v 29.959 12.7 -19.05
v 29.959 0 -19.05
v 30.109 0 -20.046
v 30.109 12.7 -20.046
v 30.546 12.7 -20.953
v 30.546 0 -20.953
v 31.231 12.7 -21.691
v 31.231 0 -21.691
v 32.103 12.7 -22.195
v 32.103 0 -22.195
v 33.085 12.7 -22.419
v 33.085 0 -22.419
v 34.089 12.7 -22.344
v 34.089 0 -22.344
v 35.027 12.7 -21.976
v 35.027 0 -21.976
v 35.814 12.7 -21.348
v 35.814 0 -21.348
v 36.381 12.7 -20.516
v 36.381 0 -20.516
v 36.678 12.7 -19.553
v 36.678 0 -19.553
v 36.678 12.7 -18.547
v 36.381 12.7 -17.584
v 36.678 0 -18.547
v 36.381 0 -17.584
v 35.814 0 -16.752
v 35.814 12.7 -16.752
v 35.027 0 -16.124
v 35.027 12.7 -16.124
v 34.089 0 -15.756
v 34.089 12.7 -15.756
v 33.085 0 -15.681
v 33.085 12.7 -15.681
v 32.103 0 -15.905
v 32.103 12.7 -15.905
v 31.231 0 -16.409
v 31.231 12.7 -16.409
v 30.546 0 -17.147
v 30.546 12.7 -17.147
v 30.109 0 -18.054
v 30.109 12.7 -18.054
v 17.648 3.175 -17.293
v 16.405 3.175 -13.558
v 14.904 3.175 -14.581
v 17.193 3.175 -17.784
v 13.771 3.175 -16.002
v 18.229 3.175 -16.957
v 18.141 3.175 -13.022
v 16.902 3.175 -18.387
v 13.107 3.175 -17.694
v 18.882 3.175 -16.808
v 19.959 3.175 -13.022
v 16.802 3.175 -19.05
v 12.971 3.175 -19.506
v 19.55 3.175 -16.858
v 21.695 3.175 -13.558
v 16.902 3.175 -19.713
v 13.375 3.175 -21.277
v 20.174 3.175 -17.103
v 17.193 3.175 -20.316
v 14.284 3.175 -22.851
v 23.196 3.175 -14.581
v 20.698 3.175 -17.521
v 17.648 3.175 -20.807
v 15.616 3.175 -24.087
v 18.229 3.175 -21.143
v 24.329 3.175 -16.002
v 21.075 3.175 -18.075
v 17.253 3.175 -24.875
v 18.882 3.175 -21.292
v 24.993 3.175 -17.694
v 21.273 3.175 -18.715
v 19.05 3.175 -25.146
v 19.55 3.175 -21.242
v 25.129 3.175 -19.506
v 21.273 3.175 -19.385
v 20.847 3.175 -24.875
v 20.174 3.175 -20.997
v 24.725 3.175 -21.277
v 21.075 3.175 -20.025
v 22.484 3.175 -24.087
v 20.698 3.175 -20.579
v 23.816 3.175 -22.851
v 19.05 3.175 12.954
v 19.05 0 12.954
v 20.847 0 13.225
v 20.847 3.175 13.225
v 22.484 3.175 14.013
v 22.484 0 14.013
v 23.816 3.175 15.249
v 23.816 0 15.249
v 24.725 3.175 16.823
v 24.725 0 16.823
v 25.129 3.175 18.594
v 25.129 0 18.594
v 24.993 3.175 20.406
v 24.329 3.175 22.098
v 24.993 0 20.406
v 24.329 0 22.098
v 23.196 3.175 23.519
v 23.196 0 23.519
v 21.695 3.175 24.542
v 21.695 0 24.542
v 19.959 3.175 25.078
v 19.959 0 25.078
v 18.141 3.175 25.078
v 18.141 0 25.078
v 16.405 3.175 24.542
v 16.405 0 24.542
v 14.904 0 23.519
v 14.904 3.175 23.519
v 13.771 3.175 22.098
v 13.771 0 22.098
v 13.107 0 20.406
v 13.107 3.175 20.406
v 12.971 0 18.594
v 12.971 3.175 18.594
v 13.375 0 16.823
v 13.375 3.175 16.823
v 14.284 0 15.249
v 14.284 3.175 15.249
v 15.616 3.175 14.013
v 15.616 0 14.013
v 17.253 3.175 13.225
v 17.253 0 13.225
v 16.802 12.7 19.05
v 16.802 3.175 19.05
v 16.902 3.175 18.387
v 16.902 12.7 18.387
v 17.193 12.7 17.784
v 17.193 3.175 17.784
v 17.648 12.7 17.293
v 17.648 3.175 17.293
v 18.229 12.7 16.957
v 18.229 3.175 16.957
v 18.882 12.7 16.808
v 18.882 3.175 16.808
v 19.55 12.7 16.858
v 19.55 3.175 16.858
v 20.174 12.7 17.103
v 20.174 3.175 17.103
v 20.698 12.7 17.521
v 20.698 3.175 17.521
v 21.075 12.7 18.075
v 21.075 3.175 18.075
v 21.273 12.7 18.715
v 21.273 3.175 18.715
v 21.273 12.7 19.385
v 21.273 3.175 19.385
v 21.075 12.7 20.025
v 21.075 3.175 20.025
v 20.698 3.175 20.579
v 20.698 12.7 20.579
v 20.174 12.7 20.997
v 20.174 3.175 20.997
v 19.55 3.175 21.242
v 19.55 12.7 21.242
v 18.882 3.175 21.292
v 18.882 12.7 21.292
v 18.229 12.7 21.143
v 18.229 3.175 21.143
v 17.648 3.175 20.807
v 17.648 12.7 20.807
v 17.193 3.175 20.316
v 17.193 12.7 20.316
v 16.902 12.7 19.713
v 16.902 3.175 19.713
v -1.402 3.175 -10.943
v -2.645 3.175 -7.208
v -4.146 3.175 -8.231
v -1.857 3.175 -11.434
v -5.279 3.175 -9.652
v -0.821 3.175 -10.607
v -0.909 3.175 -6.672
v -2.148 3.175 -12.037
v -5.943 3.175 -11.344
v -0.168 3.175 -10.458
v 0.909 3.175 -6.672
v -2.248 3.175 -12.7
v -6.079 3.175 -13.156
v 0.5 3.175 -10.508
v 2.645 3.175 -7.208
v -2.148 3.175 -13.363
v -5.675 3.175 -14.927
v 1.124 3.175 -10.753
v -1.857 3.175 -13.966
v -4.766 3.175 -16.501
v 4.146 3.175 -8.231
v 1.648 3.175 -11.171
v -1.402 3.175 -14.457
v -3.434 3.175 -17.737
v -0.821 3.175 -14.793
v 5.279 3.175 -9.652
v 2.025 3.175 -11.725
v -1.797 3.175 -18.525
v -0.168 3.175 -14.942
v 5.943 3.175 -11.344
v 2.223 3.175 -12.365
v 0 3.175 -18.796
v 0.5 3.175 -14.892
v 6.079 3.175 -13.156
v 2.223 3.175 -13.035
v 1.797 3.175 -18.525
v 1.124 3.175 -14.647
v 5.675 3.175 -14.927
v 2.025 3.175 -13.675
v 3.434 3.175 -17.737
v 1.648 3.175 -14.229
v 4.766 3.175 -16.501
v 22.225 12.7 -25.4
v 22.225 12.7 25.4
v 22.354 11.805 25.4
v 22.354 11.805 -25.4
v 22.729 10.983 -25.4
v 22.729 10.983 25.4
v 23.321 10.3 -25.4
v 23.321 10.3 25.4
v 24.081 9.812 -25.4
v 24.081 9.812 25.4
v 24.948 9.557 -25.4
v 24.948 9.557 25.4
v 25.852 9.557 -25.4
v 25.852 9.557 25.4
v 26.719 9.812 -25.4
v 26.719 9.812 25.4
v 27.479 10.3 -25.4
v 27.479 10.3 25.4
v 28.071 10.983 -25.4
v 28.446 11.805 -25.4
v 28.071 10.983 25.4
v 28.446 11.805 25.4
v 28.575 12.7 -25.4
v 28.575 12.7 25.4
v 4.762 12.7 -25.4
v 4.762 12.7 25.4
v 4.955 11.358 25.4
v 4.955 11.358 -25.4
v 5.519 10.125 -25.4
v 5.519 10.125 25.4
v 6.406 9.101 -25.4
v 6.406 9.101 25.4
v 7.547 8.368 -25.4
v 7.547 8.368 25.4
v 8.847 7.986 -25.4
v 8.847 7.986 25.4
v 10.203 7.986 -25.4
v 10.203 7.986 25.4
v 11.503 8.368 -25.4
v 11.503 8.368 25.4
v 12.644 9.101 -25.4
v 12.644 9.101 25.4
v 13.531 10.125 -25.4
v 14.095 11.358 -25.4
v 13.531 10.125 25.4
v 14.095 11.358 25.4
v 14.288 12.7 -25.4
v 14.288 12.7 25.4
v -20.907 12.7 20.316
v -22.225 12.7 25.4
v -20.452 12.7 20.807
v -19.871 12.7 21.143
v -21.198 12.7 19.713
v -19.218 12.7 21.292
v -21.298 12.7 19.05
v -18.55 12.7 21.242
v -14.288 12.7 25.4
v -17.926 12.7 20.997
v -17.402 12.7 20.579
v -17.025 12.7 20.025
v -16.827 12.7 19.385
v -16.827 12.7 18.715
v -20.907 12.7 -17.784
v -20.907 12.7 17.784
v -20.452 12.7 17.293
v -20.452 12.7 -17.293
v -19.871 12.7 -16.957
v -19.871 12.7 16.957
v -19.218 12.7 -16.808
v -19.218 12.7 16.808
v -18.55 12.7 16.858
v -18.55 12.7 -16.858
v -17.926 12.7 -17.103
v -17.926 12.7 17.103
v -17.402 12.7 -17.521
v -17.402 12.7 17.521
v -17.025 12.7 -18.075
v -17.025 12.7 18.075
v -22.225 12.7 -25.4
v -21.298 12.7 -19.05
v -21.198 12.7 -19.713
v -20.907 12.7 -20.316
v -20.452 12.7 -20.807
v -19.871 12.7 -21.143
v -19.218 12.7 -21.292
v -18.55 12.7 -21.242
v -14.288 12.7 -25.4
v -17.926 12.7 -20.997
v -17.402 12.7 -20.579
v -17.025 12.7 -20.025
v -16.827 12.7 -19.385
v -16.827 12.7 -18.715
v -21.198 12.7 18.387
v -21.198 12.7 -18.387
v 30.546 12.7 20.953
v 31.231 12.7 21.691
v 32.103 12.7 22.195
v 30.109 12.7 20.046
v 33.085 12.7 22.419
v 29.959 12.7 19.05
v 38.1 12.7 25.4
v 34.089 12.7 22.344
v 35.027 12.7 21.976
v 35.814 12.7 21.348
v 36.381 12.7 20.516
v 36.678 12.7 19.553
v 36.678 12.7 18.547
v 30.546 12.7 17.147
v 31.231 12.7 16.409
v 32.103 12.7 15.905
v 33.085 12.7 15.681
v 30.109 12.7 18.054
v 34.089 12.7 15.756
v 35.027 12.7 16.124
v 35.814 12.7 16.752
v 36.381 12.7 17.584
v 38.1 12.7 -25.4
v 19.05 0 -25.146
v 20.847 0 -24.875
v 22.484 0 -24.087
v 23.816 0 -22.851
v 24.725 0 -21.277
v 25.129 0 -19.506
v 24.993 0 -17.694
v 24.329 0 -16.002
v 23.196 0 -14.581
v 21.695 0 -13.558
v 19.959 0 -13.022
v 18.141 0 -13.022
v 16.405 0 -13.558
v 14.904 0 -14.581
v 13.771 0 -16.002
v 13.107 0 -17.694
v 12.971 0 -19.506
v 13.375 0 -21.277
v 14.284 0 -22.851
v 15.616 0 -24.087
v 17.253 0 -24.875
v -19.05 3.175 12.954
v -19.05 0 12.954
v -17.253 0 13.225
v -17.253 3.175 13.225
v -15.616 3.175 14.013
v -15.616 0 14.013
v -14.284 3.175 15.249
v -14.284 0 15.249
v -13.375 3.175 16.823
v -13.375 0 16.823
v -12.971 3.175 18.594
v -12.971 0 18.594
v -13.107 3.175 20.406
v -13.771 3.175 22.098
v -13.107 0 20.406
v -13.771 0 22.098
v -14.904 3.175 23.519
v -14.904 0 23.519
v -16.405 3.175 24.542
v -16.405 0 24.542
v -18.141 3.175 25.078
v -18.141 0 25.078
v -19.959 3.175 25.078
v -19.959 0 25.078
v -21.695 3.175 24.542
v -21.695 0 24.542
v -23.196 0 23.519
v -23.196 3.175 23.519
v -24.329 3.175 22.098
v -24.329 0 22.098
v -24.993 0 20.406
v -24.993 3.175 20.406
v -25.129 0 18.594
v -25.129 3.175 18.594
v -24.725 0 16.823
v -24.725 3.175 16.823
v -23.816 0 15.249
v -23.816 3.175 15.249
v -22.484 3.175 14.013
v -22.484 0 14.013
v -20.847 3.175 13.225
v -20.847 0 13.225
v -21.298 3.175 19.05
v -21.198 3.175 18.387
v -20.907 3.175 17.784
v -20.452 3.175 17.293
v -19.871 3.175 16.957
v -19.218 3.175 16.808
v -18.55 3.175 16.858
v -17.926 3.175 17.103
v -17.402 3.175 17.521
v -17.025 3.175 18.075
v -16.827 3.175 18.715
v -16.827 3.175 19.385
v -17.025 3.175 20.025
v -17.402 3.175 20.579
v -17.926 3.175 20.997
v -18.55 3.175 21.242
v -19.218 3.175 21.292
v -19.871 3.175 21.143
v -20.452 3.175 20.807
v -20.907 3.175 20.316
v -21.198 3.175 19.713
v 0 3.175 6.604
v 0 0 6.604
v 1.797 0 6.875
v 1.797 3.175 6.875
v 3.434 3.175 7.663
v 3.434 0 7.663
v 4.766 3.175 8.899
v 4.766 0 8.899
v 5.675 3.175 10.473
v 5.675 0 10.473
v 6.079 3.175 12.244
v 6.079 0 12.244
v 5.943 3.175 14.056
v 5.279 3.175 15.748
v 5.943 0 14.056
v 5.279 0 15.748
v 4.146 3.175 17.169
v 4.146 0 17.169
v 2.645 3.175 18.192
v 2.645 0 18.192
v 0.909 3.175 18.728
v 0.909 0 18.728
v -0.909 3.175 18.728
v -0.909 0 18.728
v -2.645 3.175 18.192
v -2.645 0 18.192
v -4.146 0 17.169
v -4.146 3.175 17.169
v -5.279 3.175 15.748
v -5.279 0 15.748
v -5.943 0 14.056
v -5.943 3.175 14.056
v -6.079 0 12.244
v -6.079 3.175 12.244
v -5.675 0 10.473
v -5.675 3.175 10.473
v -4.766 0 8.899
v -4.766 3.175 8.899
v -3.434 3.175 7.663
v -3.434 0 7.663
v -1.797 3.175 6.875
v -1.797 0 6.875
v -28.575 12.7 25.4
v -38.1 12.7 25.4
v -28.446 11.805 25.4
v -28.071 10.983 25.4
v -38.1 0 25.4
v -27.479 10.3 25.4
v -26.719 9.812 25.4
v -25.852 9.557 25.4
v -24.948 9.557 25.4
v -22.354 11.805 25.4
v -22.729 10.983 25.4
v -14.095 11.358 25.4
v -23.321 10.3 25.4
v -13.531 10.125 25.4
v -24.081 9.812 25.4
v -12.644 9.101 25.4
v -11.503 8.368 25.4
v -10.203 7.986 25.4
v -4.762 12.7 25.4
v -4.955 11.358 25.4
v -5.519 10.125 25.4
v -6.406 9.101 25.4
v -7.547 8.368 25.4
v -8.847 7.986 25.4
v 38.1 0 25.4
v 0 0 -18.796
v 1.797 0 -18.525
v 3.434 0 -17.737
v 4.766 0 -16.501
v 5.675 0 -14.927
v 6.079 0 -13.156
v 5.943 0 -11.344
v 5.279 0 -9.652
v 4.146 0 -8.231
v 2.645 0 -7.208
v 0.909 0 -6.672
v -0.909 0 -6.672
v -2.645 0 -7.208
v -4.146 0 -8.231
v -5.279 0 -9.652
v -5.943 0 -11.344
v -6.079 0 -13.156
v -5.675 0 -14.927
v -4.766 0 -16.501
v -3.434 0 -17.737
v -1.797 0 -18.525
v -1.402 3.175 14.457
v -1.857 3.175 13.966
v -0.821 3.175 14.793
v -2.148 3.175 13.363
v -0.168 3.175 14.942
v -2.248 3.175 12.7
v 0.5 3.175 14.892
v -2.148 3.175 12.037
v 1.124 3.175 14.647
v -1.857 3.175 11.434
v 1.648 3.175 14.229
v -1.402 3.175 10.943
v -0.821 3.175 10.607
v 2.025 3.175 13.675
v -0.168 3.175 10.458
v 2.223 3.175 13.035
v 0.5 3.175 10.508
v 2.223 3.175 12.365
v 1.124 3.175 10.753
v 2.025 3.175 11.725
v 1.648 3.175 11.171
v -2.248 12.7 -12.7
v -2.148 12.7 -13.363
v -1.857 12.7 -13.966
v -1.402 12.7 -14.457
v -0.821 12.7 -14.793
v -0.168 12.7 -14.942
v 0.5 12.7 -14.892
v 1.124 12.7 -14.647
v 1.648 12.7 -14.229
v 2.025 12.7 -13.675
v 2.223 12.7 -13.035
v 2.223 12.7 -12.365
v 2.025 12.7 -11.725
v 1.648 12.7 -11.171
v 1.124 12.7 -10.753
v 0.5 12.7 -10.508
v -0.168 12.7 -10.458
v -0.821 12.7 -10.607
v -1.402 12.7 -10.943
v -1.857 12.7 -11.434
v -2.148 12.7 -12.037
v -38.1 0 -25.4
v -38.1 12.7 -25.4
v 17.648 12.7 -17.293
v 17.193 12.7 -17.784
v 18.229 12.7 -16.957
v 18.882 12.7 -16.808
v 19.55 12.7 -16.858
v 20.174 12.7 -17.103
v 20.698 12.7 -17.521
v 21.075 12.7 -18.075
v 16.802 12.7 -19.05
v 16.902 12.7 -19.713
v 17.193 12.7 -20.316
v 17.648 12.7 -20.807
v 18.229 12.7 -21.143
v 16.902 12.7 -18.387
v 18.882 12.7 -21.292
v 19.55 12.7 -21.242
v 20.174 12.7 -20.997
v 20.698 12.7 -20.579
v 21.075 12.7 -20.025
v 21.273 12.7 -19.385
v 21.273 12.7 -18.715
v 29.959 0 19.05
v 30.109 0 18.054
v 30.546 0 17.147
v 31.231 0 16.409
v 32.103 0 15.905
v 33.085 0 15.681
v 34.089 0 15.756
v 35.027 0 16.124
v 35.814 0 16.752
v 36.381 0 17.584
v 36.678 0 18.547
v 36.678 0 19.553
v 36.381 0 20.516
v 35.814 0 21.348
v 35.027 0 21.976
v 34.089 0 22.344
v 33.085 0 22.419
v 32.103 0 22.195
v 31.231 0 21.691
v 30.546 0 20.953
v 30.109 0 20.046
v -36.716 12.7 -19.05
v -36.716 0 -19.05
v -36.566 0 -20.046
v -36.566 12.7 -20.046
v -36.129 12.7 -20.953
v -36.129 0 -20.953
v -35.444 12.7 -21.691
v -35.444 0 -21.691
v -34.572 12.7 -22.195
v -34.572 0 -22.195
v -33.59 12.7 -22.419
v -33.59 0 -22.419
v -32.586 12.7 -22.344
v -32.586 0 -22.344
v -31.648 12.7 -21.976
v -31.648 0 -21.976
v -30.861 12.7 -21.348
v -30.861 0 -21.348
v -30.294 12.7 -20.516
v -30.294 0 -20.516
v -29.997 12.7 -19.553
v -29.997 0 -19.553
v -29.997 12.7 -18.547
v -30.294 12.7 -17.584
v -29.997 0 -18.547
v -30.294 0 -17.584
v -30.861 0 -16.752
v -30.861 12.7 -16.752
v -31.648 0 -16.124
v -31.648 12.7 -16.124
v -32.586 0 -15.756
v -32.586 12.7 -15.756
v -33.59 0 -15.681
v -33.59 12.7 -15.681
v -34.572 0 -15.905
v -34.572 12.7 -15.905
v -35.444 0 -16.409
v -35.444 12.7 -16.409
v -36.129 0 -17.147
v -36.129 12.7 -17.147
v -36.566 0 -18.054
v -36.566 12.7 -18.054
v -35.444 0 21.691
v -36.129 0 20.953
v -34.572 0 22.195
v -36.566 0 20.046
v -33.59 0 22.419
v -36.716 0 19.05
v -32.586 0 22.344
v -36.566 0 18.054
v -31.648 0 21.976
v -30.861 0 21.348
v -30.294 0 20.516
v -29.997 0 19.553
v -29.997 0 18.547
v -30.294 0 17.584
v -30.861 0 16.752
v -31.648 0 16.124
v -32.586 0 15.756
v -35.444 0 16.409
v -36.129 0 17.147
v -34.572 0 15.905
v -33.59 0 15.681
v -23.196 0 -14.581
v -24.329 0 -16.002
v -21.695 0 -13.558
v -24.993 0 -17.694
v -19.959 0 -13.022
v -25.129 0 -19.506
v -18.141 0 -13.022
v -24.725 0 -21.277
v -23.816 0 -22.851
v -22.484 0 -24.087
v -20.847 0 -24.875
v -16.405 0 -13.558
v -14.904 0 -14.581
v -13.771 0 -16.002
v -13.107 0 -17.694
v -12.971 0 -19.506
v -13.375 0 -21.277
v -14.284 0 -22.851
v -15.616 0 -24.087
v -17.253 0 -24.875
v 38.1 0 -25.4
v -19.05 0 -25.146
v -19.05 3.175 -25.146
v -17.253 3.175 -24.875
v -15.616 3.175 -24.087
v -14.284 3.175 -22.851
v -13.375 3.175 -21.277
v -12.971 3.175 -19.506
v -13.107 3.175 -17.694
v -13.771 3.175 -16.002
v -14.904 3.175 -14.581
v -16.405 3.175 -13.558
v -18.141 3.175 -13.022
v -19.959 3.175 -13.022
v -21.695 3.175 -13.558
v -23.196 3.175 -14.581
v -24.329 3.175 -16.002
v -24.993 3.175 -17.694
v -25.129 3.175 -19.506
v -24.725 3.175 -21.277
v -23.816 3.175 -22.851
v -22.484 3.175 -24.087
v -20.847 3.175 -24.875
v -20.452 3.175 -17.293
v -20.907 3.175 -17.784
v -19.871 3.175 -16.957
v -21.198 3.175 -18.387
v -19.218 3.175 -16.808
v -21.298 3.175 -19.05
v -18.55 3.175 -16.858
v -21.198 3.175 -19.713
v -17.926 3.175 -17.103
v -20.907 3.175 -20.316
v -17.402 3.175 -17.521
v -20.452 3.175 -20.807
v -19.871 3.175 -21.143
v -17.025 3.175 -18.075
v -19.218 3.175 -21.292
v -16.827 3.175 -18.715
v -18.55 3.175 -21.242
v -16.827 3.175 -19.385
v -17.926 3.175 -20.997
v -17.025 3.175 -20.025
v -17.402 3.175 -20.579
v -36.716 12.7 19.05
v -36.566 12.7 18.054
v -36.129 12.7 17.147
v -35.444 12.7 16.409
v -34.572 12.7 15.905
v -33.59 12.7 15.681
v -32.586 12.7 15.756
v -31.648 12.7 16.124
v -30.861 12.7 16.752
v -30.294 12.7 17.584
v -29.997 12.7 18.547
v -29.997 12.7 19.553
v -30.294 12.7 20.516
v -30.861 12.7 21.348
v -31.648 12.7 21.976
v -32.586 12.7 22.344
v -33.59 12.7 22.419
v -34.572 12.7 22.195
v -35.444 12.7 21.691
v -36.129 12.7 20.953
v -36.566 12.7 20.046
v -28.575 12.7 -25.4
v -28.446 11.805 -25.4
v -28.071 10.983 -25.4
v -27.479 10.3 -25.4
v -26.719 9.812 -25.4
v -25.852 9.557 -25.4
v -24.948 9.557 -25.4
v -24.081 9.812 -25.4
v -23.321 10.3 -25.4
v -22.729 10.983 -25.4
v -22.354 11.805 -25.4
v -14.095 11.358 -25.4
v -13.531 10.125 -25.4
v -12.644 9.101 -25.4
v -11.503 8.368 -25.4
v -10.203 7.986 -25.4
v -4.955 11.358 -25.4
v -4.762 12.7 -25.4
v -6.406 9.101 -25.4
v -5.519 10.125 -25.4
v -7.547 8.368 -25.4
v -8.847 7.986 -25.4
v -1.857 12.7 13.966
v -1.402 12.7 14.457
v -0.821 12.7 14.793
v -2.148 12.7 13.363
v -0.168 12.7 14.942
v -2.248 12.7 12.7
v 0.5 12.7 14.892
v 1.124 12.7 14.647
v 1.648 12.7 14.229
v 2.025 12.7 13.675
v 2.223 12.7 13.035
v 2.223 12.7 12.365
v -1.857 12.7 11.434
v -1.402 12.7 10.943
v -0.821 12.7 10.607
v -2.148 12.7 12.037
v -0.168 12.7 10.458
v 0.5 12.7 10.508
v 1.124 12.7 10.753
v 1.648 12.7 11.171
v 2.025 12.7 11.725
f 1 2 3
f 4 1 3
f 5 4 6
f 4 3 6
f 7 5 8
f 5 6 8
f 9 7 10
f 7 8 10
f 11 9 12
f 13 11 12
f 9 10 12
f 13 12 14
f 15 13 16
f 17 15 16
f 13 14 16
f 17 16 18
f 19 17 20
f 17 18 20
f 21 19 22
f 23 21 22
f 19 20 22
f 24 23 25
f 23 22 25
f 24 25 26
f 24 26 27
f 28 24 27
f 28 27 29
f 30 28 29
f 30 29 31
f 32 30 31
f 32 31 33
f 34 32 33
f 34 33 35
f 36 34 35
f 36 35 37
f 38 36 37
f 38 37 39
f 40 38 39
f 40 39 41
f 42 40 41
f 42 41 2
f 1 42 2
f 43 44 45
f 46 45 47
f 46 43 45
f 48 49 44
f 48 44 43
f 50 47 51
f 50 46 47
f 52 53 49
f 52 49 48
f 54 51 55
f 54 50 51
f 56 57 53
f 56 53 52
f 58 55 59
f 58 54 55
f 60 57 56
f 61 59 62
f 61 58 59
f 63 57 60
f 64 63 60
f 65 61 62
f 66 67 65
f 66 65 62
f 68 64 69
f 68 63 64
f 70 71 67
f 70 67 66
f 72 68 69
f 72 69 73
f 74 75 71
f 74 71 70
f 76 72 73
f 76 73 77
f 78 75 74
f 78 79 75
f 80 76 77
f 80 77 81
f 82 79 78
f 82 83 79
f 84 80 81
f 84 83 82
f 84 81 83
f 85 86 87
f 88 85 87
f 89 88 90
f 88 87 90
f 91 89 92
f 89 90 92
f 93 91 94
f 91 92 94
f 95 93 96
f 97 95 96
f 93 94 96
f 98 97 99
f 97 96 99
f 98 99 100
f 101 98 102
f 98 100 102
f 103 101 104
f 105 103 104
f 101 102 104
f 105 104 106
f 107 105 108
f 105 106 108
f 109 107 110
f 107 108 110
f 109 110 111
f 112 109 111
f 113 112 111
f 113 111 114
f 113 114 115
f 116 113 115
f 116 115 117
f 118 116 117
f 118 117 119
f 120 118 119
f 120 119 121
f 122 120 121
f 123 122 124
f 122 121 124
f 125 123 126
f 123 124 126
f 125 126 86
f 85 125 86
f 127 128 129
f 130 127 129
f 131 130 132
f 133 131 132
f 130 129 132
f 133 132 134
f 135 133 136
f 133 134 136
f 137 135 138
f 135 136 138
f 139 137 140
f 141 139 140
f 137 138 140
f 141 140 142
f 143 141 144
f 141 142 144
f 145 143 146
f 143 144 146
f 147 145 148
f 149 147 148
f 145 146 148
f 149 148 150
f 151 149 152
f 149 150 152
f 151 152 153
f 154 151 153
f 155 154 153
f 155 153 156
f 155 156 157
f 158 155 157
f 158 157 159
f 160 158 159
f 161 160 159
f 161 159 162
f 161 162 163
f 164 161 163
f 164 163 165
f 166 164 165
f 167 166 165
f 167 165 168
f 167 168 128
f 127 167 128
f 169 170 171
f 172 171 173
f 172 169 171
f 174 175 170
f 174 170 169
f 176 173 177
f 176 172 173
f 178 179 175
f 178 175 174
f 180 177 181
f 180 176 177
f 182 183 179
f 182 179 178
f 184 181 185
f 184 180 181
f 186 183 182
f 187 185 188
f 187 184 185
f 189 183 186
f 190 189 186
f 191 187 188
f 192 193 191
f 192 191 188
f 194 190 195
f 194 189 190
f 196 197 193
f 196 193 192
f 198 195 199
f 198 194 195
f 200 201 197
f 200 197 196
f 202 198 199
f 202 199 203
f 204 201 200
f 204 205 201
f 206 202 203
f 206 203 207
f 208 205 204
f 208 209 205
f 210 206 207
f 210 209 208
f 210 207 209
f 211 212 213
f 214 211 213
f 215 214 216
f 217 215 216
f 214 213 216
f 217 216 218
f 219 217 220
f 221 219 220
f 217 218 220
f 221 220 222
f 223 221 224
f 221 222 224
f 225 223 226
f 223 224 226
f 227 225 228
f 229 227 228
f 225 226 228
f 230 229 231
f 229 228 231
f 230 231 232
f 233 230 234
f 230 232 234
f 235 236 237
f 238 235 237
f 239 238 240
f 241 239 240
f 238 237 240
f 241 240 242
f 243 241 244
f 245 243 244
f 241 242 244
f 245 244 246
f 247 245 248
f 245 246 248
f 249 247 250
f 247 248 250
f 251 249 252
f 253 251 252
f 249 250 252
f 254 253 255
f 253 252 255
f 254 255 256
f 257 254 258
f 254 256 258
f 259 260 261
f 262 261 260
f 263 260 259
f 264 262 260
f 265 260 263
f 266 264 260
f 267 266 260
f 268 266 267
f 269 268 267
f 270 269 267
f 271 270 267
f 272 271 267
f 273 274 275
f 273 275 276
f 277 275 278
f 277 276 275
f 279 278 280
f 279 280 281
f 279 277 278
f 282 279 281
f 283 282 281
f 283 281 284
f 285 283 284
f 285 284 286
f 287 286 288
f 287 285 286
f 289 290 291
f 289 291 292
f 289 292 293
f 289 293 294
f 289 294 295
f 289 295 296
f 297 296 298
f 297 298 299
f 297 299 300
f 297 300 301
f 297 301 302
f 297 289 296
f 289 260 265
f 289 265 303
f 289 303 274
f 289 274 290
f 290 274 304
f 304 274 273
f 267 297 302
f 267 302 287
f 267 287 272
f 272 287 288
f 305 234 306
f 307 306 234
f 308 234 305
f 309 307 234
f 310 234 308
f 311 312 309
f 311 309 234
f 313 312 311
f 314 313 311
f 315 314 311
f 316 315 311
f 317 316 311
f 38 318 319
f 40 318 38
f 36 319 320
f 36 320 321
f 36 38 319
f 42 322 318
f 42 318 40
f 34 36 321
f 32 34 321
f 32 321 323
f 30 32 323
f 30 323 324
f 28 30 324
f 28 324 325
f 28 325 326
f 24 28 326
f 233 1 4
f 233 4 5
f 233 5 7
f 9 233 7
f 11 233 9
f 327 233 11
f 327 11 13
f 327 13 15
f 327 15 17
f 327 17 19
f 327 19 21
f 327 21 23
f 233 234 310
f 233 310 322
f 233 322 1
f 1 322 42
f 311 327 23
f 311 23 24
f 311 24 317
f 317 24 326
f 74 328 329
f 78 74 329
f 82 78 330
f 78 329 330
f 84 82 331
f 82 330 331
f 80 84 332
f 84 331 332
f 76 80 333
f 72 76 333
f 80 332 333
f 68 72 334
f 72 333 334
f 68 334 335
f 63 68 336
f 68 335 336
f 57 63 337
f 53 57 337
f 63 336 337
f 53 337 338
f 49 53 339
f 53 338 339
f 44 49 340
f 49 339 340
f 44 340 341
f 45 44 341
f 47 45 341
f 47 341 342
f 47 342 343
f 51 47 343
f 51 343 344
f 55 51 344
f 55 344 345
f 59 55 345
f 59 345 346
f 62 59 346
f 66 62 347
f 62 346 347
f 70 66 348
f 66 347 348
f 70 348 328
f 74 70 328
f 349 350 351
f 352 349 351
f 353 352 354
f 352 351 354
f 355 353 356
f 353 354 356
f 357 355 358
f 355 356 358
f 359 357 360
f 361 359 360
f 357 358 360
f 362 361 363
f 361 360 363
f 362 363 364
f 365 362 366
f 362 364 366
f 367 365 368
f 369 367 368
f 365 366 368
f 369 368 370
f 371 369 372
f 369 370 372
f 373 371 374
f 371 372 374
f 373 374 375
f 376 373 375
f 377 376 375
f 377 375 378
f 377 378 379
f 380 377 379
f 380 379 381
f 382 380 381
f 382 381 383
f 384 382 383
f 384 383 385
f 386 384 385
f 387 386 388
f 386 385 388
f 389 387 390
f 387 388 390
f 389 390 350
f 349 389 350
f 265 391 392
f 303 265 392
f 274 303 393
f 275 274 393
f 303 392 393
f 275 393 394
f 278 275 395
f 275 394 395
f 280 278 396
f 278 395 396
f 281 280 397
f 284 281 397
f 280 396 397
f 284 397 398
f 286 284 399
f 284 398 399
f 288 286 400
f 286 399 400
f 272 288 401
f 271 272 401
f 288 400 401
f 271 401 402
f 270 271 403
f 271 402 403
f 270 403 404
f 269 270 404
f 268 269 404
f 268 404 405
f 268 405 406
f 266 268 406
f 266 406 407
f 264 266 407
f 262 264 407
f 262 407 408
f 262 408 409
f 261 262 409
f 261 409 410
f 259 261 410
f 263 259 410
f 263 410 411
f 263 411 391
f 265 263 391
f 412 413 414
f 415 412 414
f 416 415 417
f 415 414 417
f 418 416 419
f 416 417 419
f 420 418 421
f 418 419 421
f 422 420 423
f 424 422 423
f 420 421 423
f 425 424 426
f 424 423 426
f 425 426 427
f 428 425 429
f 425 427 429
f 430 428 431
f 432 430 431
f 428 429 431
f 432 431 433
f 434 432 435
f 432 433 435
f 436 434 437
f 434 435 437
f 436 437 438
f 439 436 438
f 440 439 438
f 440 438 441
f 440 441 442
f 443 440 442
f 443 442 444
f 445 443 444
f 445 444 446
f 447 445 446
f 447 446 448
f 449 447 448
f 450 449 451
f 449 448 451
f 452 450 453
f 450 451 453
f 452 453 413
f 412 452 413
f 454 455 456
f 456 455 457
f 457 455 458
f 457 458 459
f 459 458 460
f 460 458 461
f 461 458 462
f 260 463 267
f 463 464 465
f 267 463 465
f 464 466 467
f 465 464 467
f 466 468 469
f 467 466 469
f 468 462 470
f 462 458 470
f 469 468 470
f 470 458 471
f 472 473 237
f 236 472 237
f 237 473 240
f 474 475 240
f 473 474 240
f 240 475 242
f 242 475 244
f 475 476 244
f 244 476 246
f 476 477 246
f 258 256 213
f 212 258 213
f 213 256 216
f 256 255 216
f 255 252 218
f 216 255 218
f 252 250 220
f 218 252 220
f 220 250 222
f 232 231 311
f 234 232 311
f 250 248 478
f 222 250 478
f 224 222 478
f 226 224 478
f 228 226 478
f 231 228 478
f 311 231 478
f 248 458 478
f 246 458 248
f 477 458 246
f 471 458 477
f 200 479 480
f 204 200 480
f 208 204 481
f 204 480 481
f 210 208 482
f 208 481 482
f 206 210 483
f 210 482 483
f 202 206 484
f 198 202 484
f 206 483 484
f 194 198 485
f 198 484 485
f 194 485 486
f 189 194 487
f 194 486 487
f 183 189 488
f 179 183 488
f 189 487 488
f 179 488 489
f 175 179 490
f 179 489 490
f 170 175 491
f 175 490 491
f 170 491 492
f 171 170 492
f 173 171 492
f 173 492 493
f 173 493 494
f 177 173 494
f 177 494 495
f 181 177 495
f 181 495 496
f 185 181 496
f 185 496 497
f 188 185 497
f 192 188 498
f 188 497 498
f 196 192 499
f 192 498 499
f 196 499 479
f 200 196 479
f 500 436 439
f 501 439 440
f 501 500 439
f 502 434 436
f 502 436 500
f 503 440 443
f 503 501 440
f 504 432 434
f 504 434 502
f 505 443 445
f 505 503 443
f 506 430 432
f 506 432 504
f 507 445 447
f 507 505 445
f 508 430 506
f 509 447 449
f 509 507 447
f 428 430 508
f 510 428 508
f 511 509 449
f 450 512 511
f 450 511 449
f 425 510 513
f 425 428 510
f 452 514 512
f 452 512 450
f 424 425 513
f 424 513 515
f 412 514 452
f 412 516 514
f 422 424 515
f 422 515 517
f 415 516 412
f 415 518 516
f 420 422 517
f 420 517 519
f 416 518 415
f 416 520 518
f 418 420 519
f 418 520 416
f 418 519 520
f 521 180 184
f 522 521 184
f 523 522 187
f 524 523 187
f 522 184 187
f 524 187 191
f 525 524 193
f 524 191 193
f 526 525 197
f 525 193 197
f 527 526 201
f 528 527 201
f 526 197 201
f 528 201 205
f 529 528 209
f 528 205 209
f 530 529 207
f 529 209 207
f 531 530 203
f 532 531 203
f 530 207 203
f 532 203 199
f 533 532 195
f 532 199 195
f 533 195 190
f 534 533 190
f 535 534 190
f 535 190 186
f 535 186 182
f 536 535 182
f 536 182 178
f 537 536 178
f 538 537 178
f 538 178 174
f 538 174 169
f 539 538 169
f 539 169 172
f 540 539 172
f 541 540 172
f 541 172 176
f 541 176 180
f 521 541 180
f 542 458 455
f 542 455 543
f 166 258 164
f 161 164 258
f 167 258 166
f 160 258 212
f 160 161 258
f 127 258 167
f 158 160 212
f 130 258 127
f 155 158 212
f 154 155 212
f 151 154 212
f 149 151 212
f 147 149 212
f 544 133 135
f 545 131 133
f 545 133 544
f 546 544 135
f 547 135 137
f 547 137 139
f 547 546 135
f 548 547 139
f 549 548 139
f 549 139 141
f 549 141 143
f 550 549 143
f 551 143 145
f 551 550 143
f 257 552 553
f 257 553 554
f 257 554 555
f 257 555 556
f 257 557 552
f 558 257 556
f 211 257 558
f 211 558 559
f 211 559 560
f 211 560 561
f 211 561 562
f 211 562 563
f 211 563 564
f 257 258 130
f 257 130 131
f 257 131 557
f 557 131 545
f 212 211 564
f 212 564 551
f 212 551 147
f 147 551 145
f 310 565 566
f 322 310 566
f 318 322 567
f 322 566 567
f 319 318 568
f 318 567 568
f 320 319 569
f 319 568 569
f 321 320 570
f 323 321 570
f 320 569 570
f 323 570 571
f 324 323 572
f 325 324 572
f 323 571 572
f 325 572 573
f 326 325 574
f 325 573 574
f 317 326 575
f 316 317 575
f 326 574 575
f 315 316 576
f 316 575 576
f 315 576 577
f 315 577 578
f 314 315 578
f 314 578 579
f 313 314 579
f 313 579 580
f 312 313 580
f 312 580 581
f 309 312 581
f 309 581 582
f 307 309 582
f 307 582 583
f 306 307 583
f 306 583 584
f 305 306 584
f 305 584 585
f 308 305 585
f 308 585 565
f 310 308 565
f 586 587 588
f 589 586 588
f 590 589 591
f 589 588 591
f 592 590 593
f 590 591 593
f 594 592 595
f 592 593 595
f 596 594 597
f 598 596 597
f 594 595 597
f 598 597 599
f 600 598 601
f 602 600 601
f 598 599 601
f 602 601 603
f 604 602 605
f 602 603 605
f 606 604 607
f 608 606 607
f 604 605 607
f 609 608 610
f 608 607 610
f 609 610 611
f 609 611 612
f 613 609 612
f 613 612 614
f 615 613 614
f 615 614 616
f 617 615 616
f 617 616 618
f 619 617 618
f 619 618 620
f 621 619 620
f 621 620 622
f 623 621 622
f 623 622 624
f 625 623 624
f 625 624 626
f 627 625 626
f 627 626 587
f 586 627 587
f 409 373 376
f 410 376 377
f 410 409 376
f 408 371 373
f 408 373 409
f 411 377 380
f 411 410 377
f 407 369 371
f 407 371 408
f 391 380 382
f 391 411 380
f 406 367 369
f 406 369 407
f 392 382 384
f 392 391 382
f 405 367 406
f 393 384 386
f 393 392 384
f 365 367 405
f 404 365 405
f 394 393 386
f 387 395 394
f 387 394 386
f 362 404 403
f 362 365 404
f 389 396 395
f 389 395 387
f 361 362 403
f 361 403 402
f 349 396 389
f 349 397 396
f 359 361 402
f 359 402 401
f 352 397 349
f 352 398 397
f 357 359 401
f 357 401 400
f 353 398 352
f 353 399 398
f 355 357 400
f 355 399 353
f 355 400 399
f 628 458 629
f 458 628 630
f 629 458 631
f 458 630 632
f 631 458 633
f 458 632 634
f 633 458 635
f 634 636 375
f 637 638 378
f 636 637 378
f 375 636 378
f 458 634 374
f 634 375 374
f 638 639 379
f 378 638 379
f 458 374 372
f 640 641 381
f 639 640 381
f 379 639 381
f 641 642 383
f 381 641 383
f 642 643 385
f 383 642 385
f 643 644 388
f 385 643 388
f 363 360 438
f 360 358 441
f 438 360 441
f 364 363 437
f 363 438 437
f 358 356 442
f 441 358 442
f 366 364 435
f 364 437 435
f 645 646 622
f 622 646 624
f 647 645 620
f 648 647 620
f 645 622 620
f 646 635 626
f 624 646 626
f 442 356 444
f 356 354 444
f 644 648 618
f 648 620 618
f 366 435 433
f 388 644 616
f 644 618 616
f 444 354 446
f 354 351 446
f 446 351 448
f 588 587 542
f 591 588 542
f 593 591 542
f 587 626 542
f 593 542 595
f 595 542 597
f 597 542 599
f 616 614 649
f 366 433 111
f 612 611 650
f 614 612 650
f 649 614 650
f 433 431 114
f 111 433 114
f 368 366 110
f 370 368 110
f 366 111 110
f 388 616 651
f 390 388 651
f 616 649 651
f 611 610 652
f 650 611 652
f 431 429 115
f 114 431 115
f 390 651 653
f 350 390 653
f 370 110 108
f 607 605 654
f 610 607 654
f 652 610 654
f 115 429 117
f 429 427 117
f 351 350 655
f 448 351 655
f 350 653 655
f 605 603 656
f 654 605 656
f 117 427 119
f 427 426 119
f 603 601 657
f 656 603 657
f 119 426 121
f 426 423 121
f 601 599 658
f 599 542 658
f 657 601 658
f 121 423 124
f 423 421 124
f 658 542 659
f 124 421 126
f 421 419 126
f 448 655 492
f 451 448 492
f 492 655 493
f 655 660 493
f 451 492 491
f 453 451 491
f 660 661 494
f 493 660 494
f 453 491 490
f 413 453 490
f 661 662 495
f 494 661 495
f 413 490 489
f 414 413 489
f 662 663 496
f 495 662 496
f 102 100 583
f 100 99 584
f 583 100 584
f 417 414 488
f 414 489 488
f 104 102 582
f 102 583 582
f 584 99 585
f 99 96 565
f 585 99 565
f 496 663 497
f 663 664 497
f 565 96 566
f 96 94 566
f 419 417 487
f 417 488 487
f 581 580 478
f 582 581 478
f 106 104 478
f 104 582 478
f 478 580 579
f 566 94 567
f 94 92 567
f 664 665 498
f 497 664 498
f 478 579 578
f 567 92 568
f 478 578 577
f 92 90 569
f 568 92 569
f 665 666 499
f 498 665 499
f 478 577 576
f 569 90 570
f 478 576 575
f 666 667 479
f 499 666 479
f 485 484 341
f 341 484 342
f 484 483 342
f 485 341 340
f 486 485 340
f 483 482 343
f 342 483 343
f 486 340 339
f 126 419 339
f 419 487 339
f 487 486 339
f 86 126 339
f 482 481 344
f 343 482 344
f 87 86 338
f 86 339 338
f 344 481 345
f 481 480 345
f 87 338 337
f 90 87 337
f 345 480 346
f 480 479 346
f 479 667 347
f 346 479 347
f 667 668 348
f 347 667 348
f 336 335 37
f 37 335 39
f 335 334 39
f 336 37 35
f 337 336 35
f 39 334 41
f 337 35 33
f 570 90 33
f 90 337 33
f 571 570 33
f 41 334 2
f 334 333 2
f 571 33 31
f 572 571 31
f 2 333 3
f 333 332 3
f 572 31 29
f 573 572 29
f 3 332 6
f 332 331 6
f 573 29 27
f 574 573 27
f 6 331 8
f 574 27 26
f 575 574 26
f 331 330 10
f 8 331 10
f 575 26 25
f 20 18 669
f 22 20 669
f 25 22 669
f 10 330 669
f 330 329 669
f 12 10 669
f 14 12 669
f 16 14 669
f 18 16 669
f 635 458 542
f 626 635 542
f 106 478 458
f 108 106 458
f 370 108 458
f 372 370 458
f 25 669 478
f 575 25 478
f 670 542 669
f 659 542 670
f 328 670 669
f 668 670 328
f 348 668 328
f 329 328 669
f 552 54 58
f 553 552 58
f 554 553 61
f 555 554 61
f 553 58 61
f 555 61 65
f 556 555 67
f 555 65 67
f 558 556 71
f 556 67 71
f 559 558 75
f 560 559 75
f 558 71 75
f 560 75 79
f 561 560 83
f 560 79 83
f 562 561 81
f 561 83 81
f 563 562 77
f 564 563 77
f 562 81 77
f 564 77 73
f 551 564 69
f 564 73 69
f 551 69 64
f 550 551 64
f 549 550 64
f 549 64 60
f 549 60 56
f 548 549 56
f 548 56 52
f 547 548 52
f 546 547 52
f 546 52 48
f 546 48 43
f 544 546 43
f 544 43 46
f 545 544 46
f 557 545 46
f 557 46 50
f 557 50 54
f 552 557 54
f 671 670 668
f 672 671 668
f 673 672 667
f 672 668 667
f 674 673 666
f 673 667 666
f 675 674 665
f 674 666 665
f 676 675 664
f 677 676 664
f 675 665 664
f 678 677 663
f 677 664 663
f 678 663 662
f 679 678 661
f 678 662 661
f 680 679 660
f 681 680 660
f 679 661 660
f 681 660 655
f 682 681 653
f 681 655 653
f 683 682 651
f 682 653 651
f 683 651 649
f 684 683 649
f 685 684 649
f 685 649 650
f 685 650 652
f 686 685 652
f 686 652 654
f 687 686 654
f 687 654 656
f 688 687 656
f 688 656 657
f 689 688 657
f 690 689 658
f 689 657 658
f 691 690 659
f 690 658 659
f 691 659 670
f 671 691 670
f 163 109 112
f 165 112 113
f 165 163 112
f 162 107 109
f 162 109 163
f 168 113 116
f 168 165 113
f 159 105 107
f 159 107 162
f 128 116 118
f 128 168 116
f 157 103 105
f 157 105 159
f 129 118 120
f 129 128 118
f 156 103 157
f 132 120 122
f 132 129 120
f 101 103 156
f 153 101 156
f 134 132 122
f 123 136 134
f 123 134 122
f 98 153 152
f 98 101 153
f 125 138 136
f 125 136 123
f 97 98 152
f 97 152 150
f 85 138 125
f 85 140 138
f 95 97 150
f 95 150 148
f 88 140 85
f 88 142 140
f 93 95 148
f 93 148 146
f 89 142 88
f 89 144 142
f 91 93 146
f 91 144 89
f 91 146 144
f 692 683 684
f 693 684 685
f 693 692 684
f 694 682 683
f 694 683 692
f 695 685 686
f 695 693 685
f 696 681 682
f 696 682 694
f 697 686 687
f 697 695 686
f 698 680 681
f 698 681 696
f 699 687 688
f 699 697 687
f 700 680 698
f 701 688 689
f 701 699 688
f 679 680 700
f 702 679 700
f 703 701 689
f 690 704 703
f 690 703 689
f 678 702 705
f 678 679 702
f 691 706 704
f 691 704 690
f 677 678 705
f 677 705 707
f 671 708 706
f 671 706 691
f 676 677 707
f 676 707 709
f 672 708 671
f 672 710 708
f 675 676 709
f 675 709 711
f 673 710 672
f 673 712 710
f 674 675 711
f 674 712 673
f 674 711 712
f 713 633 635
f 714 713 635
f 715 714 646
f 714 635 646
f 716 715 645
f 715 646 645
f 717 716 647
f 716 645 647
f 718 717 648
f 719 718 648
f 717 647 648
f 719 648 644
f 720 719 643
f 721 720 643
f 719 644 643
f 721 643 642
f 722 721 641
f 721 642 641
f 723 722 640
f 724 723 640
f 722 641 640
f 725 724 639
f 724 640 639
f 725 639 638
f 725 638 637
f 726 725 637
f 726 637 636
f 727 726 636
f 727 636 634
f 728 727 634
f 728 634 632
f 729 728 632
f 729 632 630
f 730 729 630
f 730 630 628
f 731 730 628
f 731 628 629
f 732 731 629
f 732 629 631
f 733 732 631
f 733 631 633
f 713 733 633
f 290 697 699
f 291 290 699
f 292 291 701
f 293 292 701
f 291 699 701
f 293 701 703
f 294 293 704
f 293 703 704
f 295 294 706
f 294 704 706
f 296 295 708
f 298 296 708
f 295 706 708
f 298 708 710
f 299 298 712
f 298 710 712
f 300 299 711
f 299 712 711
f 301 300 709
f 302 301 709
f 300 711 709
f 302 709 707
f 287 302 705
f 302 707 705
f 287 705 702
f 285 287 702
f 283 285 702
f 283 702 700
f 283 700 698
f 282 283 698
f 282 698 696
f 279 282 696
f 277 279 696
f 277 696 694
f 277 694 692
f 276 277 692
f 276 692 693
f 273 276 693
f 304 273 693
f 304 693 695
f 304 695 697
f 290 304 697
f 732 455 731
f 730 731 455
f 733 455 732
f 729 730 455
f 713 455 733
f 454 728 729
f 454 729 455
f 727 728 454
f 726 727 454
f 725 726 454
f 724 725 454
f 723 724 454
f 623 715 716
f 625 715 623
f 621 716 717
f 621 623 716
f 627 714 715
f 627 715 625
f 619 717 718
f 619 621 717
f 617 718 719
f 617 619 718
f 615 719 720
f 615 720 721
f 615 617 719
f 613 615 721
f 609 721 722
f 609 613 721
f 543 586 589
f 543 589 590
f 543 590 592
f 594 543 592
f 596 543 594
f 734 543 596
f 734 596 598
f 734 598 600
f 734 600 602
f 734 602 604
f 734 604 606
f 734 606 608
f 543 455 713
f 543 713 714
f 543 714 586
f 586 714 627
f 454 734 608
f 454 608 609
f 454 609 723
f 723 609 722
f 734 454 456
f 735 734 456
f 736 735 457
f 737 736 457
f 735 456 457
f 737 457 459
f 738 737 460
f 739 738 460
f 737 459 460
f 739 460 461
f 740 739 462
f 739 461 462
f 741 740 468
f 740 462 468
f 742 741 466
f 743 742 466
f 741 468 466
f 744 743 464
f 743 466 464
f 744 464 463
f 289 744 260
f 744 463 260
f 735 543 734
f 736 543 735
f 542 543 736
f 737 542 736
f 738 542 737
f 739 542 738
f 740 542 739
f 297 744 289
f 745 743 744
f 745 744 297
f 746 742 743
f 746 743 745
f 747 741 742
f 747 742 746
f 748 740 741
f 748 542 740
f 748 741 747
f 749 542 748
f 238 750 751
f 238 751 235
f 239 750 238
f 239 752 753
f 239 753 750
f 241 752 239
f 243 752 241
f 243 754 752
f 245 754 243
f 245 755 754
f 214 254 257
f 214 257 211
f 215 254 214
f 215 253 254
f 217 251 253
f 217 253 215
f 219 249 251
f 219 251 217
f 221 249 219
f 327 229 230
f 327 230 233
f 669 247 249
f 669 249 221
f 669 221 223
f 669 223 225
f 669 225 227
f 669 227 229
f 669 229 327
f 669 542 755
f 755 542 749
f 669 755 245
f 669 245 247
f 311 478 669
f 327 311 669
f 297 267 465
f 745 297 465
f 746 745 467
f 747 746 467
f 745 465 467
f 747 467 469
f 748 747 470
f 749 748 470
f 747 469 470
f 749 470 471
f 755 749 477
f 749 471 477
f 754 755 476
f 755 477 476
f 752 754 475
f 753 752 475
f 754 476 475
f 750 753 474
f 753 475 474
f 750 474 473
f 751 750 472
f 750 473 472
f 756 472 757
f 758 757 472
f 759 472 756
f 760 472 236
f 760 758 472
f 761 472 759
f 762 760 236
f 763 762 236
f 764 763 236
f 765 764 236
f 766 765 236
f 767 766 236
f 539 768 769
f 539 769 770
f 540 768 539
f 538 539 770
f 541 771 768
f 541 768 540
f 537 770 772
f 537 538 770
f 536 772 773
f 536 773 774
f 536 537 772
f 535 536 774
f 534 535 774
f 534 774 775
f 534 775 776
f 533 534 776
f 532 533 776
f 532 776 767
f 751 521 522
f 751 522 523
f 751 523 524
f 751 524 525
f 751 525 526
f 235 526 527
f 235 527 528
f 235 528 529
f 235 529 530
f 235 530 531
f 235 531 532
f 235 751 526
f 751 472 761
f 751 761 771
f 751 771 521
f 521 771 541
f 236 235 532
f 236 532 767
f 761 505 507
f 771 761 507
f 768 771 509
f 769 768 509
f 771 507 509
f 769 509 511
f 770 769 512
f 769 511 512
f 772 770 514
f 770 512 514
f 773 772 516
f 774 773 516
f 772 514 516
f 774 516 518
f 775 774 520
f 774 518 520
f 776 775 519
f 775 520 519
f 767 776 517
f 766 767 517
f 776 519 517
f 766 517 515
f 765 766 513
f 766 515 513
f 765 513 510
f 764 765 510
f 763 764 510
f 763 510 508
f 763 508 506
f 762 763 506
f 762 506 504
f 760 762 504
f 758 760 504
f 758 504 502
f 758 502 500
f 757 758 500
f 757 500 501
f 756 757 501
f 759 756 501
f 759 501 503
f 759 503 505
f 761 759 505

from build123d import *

# Parameters (mm, degrees)
SKETCH1_W               = 76.2
SKETCH1_H               = 50.8
BOSS_EXTRUDE1_DEPTH     = 12.7
SKETCH2_R               = 3.175
CUT_EXTRUDE1_DEPTH      = 65.757547823
SKETCH3_R               = 4.7625
CUT_EXTRUDE2_DEPTH      = 65.757547823
F_1_4_CLEARANCE_HOLE1_D = 6.7564
F_8_CLEARANCE_HOLE1_D   = 4.4958
SKETCH8_R               = 6.096
CUT_EXTRUDE3_DEPTH      = 3.175


with BuildPart() as part:
    # Sketch1 → Boss-Extrude1 (new body)
    with BuildSketch(Plane(origin=(0, 0, 0), x_dir=(1, 0, 0), z_dir=(0, 1, 0))):
        Rectangle(SKETCH1_W, SKETCH1_H)
    extrude(amount=BOSS_EXTRUDE1_DEPTH)

    # Sketch2 → Cut-Extrude1 (cut, through all)
    with BuildSketch(Plane.XY.offset(25.4)):
        with Locations((-25.4, 12.7)):
            Circle(SKETCH2_R)
        with Locations((25.4, 12.7)):
            Circle(SKETCH2_R)
    extrude(amount=-CUT_EXTRUDE1_DEPTH, mode=Mode.SUBTRACT)

    # Sketch3 → Cut-Extrude2 (cut, through all)
    with BuildSketch(Plane.XY.offset(25.4)):
        with Locations((-9.525, 12.7)):
            Circle(SKETCH3_R)
        with Locations((9.525, 12.7)):
            Circle(SKETCH3_R)
    extrude(amount=-CUT_EXTRUDE2_DEPTH, mode=Mode.SUBTRACT)

    # 1/4 Clearance Hole1 (through all)
    with Locations(Plane(origin=(0, 12.7, 0), x_dir=(1, 0, 0), z_dir=(0, 1, 0))):
        with Locations((-33.3375, -19.05), (-33.3375, 19.05), (33.3375, 19.05), (33.3375, -19.05)):
            Hole(F_1_4_CLEARANCE_HOLE1_D / 2)

    # #8 Clearance Hole1 (through all)
    with Locations(Plane(origin=(0, 12.7, 0), x_dir=(1, 0, 0), z_dir=(0, 1, 0))):
        with Locations((-19.05, -19.05), (-19.05, 19.05), (0, 12.7), (0, -12.7), (19.05, -19.05), (19.05, 19.05)):
            Hole(F_8_CLEARANCE_HOLE1_D / 2)

    # Sketch8 → Cut-Extrude3 (cut)
    with BuildSketch(Plane.XZ):
        with Locations(Location((-19.05, 19.05, 0), (0, 0, 270))):
            Circle(SKETCH8_R)
        with Locations(Location((0, 12.7, 0), (0, 0, 270))):
            Circle(SKETCH8_R)
        with Locations(Location((19.05, 19.05, 0), (0, 0, 270))):
            Circle(SKETCH8_R)
        with Locations(Location((19.05, -19.05, 0), (0, 0, 270))):
            Circle(SKETCH8_R)
        with Locations(Location((-19.05, -19.05, 0), (0, 0, 270))):
            Circle(SKETCH8_R)
        with Locations(Location((0, -12.7, 0), (0, 0, 270))):
            Circle(SKETCH8_R)
    extrude(amount=-CUT_EXTRUDE3_DEPTH, mode=Mode.SUBTRACT)


solid = part.part
